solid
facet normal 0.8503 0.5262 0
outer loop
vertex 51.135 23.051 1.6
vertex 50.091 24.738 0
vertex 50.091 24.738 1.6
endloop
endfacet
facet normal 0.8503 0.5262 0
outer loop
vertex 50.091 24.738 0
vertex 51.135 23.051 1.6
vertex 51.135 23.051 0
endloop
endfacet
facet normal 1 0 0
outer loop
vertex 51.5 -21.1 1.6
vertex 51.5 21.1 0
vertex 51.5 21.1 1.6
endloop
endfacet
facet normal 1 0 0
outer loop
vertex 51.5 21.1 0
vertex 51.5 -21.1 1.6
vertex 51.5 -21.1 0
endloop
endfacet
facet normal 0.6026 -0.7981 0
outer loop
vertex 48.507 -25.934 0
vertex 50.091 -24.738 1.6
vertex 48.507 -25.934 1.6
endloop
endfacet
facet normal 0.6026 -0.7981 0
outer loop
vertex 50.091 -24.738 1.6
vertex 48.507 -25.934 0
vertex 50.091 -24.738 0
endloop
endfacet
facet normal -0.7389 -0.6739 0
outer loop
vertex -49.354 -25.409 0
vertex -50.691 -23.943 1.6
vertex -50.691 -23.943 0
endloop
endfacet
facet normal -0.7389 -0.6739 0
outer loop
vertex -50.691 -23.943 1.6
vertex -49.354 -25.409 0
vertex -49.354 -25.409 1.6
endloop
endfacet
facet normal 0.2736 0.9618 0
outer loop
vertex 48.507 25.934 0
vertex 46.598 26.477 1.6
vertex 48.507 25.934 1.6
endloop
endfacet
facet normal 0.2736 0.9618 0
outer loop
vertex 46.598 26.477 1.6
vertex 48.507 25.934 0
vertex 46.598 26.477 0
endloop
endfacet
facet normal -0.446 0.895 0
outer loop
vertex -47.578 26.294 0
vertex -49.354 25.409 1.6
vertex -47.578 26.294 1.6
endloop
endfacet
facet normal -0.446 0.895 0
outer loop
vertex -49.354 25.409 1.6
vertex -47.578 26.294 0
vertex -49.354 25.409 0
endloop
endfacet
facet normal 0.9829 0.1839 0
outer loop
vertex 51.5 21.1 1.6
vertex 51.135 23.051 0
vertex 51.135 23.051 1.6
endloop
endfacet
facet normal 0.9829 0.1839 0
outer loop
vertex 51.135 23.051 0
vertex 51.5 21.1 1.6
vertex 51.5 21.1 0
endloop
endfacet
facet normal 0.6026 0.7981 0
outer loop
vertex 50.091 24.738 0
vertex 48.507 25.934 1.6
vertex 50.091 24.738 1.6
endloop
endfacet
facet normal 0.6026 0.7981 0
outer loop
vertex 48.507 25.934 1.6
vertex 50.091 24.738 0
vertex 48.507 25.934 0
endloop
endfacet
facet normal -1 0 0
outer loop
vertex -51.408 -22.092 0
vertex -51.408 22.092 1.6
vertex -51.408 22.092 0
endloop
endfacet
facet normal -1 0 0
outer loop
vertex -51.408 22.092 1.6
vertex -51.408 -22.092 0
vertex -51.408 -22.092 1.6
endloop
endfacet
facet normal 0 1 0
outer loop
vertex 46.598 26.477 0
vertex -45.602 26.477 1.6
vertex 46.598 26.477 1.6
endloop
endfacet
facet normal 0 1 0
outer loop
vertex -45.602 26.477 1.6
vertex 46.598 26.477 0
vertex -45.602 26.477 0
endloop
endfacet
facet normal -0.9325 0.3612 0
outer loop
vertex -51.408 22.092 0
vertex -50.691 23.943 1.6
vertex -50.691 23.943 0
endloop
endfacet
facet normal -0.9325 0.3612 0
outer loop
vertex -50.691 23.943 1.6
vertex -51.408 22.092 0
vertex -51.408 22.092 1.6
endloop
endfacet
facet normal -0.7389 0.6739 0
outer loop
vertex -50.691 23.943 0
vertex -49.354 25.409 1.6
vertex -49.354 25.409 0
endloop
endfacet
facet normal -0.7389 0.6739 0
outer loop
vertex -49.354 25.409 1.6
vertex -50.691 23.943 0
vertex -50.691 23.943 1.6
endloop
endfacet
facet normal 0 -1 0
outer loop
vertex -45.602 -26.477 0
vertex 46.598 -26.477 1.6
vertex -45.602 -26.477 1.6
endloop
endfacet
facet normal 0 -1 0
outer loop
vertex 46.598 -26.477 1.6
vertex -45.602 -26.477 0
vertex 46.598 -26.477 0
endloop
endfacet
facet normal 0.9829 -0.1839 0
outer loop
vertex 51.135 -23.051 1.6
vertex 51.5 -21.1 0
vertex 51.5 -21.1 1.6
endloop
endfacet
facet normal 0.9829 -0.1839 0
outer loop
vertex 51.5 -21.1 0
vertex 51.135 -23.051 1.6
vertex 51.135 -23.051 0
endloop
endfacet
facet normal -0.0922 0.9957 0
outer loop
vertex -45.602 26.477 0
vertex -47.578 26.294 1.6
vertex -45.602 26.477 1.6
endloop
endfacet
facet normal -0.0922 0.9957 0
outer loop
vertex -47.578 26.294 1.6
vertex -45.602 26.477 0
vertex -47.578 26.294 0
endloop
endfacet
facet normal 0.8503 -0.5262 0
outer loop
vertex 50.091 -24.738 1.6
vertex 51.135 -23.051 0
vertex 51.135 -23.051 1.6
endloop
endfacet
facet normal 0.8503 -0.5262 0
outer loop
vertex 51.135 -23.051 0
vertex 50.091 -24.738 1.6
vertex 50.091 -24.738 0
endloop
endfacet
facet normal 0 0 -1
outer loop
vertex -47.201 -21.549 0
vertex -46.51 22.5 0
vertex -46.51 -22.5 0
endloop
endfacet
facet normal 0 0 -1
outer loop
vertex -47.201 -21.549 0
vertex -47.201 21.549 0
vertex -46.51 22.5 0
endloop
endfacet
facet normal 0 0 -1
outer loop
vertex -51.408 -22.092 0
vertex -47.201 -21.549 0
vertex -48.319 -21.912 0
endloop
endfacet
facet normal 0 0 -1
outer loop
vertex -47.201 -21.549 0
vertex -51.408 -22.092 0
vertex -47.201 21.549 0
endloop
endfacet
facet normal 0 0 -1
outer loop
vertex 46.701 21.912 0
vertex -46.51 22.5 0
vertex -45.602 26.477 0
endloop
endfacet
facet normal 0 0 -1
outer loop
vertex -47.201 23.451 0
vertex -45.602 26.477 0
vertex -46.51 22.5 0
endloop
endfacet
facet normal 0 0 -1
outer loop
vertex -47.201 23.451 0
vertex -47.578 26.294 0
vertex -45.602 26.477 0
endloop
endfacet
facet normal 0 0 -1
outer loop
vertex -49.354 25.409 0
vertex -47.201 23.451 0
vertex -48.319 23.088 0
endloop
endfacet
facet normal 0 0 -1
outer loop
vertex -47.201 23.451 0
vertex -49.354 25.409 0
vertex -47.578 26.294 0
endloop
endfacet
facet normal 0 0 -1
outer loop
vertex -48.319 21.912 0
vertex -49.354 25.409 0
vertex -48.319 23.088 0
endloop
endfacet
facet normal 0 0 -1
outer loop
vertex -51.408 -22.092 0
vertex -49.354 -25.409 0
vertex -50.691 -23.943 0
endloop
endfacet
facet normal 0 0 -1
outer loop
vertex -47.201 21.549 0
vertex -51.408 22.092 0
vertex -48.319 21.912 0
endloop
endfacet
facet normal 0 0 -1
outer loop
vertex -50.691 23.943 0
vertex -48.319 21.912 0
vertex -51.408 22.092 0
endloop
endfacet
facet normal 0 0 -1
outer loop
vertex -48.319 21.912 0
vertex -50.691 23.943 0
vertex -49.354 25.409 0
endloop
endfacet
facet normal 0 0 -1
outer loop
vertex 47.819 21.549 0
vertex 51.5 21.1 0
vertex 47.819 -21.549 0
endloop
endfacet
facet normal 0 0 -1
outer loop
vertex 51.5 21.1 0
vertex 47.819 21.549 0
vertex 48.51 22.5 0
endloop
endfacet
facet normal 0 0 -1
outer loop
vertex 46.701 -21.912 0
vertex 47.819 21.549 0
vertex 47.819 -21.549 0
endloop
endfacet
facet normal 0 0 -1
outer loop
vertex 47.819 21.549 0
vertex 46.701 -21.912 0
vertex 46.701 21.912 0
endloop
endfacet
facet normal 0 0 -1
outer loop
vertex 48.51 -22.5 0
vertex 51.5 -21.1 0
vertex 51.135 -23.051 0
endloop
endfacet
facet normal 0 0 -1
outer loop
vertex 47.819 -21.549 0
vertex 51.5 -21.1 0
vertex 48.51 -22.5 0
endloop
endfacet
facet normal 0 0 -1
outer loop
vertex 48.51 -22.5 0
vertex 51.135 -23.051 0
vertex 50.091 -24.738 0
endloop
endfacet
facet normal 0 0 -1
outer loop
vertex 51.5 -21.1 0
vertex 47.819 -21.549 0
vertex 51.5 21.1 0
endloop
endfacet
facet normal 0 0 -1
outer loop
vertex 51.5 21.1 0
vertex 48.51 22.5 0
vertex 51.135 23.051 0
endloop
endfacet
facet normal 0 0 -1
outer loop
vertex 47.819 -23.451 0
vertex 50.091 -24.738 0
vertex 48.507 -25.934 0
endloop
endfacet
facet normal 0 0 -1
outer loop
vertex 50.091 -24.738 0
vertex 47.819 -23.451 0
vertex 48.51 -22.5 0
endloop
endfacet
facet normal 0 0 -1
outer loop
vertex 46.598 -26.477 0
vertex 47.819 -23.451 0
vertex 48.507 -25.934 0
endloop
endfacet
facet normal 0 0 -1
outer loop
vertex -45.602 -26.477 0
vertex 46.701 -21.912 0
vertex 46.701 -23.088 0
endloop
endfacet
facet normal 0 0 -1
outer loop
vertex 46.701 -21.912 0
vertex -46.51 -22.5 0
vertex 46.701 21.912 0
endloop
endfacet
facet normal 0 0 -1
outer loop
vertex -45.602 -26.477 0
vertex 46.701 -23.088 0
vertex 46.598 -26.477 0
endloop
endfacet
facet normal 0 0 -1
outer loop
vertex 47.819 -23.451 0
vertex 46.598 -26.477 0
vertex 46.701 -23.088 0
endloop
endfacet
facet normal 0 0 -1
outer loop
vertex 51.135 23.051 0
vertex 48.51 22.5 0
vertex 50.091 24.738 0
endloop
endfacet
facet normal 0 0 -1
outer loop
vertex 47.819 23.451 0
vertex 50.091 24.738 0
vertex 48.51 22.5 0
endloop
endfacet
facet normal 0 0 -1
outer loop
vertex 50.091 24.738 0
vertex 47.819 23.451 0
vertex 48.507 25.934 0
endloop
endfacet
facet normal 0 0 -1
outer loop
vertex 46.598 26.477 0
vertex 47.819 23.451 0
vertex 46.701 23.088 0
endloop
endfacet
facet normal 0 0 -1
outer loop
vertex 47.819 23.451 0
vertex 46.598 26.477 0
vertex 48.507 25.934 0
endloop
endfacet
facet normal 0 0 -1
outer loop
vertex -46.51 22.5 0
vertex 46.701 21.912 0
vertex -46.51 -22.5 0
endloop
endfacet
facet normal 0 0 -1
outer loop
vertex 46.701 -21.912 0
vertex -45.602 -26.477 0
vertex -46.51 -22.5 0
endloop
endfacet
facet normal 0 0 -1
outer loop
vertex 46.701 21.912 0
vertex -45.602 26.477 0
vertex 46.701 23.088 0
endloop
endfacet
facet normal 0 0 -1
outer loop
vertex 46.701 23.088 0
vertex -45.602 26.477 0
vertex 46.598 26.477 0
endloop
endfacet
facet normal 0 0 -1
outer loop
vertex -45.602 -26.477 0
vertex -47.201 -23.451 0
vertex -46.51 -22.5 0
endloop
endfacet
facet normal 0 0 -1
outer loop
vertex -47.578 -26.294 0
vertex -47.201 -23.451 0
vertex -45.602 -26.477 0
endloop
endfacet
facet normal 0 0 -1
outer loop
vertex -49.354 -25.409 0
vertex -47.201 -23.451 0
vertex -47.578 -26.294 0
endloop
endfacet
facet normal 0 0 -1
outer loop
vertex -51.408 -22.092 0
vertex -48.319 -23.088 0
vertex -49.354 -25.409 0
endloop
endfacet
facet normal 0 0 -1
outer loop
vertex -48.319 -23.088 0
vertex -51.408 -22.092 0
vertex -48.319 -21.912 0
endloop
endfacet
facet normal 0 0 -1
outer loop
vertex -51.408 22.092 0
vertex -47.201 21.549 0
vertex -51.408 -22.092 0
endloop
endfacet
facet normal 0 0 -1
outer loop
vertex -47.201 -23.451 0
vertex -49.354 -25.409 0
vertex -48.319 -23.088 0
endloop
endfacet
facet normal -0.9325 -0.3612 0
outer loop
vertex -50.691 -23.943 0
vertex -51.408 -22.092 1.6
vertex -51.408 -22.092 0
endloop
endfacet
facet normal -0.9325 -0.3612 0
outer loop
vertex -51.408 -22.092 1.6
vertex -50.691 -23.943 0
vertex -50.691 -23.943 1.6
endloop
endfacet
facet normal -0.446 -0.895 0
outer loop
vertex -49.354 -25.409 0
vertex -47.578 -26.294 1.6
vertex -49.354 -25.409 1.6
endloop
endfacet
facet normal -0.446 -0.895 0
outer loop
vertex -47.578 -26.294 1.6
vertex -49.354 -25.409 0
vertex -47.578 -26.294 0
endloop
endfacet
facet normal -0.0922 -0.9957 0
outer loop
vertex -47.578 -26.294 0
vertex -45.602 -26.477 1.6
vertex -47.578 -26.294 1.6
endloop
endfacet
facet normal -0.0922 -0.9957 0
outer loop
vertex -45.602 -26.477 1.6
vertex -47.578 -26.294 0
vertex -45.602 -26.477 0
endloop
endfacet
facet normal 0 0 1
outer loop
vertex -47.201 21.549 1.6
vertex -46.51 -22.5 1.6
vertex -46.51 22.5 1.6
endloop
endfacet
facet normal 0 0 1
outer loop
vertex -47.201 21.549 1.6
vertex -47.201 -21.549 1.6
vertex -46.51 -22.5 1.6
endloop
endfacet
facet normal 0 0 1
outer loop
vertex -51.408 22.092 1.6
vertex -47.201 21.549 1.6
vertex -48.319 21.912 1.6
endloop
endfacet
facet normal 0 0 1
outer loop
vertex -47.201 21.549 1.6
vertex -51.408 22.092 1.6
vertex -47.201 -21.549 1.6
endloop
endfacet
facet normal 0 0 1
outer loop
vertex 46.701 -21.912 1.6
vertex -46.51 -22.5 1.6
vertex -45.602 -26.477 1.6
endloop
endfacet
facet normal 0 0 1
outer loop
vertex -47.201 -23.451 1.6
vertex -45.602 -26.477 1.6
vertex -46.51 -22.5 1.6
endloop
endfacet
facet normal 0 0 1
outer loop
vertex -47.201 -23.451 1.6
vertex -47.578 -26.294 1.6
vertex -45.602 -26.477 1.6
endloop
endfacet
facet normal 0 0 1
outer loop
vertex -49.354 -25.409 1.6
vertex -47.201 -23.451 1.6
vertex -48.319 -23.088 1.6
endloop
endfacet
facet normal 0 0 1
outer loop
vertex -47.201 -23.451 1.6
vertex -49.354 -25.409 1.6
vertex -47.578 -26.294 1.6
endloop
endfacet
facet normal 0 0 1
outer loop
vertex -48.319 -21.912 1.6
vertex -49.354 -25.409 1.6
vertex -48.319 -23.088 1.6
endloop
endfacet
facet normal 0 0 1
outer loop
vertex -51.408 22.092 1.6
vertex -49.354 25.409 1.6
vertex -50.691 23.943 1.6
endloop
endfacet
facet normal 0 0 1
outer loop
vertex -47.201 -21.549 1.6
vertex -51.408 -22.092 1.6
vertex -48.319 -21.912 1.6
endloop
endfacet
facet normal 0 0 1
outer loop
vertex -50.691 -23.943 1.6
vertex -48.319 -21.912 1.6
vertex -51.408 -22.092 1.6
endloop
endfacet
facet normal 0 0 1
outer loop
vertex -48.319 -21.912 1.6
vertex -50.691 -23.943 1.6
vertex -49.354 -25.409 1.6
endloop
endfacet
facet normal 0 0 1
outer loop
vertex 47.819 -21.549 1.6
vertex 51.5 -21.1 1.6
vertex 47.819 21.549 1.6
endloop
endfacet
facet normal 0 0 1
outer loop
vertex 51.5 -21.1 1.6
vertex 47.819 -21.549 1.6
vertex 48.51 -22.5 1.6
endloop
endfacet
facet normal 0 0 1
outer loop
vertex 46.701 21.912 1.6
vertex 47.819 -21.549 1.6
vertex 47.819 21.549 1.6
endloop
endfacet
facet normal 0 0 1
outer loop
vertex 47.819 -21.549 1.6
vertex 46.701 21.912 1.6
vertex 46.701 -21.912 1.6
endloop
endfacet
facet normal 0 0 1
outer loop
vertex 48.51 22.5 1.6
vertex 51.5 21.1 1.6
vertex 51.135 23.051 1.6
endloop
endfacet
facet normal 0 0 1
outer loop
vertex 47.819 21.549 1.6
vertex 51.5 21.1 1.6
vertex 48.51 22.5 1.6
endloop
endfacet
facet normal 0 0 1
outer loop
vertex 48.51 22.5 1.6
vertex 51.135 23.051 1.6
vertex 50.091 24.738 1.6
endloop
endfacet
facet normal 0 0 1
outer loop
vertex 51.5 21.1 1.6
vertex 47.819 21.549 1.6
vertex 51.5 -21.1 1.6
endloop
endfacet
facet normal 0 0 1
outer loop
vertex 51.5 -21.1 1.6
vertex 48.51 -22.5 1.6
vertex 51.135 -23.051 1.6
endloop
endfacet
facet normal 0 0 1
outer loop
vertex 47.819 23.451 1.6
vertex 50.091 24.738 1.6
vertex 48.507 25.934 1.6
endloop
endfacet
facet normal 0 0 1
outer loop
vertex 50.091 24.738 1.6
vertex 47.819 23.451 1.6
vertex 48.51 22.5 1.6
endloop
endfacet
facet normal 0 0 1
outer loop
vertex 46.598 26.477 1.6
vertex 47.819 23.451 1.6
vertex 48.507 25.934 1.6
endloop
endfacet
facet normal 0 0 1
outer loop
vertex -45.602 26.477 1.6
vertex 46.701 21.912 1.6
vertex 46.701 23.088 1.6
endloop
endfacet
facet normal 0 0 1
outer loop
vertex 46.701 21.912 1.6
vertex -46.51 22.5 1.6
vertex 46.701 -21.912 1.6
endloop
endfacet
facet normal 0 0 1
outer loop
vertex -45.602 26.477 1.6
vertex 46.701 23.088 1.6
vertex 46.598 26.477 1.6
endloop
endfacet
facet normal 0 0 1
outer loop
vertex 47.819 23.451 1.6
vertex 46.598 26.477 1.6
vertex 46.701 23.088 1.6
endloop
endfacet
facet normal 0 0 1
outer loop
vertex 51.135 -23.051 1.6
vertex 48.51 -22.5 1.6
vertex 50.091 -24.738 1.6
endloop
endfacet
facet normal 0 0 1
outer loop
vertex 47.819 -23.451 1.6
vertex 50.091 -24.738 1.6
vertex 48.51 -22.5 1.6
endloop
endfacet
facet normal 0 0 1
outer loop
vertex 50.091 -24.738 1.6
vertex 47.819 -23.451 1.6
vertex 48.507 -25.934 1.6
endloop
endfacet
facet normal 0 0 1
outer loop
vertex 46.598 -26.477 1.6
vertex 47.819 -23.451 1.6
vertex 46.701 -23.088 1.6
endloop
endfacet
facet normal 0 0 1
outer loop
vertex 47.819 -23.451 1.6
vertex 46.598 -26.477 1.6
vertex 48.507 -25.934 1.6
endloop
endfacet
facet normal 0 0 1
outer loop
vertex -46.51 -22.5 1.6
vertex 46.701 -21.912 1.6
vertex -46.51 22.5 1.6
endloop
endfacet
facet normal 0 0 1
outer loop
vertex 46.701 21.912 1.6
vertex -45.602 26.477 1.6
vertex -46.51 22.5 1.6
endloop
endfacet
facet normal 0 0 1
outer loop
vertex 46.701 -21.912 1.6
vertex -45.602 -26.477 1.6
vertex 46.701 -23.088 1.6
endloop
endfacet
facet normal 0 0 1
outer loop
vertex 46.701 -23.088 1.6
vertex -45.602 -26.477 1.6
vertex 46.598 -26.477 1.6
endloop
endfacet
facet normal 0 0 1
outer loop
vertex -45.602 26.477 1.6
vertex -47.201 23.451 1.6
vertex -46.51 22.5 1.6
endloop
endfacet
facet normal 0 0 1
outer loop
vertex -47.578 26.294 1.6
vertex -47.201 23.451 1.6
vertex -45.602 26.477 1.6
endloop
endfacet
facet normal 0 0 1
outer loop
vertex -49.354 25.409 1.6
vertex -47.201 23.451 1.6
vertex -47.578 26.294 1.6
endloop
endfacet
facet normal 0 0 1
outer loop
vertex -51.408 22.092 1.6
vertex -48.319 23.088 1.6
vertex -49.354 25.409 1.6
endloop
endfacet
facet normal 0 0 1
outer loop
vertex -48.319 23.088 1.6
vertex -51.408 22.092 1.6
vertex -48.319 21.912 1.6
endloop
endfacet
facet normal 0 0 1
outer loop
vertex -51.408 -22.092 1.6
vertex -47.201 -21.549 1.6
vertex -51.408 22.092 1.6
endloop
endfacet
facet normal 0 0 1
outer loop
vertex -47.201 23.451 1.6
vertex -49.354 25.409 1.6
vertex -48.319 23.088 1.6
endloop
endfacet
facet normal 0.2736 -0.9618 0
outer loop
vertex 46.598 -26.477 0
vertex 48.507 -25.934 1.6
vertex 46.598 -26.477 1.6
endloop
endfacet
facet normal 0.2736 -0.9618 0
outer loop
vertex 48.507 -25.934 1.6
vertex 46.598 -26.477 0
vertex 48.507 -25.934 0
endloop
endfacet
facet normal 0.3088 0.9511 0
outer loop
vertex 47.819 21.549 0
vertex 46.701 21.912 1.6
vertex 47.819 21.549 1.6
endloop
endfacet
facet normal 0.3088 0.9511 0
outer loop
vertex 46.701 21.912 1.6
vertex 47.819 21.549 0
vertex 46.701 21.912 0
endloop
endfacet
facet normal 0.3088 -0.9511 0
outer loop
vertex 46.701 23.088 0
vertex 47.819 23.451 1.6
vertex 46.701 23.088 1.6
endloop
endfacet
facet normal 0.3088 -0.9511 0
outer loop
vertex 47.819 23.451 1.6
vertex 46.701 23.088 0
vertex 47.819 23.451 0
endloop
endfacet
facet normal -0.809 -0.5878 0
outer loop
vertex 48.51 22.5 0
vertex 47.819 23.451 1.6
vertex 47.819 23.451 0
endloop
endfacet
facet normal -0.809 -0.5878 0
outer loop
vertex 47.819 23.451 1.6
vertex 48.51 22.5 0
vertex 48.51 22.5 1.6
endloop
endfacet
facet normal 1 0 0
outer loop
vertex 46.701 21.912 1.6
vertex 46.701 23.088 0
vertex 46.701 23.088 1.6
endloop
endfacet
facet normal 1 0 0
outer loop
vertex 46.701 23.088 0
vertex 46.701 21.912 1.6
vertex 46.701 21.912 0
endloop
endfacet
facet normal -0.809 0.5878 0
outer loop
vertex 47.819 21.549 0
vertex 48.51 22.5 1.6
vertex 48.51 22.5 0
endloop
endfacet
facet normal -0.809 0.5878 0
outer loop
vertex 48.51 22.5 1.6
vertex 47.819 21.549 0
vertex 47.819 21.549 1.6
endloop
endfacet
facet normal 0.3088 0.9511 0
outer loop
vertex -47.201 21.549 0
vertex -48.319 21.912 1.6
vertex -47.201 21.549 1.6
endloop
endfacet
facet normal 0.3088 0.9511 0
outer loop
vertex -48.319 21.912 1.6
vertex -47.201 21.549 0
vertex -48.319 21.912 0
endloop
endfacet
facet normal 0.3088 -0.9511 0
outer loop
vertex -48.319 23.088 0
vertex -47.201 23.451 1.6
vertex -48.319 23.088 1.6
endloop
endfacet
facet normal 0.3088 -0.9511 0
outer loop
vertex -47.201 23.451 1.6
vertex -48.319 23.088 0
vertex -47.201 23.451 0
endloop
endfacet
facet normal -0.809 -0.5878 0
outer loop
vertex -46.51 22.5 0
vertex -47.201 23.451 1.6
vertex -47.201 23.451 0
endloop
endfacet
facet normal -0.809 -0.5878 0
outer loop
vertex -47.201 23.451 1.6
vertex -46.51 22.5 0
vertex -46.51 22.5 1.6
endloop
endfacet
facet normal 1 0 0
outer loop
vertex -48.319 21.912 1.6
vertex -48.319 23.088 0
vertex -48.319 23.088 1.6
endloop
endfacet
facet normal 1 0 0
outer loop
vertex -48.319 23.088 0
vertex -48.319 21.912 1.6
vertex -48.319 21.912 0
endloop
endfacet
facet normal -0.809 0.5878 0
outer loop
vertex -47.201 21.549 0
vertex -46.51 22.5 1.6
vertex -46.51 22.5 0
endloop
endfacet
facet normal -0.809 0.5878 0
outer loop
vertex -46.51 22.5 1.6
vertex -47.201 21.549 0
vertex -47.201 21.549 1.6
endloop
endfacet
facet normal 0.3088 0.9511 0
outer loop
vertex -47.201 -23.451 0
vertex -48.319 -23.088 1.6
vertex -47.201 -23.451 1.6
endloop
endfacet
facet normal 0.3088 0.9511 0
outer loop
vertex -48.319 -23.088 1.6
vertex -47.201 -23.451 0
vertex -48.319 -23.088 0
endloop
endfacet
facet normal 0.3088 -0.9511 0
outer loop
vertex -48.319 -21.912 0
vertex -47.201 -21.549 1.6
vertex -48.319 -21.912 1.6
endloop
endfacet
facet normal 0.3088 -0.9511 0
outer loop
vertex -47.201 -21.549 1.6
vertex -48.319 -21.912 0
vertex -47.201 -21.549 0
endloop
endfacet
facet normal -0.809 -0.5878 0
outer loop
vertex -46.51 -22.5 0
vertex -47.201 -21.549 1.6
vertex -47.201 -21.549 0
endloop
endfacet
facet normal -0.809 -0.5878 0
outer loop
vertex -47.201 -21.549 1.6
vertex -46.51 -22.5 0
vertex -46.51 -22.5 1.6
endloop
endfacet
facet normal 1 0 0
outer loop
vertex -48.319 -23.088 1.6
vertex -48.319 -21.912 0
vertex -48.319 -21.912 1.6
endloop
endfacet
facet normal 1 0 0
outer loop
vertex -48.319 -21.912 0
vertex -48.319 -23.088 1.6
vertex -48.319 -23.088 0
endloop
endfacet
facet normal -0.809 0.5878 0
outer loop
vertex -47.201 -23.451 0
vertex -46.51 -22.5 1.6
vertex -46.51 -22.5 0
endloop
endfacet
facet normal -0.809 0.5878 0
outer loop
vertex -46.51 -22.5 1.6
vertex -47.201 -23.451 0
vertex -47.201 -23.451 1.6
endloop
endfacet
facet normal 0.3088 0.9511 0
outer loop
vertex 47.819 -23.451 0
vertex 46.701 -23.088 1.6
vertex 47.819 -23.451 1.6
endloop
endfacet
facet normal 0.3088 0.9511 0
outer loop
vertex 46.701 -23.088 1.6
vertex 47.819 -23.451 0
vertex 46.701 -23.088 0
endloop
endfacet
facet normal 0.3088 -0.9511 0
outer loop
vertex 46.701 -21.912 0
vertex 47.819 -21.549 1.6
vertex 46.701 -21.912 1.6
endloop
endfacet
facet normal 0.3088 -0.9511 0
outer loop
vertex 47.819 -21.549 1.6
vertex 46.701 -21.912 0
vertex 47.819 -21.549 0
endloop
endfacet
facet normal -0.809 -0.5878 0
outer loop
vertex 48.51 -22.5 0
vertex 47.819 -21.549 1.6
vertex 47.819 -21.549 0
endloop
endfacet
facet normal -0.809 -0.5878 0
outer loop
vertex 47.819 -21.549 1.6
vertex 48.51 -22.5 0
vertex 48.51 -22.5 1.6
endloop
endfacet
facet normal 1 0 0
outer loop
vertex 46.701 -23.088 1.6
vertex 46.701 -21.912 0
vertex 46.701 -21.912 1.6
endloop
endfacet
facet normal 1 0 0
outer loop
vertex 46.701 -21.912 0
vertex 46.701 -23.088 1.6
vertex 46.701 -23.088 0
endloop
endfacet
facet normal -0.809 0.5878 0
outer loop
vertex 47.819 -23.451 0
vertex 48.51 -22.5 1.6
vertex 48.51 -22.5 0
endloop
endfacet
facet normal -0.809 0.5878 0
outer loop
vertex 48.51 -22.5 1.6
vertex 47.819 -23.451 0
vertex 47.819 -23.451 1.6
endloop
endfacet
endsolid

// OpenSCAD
// file: ../configuration.scad
//UNIBOX04A
//------------------------------------------------------------
///*

rozmer_x=103;
rozmer_y=53;
sila=1.5;

roztec_srouby_x=95.02;
roztec_srouby_y=45;
prumer_sroubu=2;
zakulaceni_hrany=5.4;

roztec_der=10.16;
pocet_der_osa_x=8;
// main file
include <../configuration.scad>


//PLBASE ZAKLADNI
//------------------------------------------------------------

UNIBOX04A_D01();

module UNIBOX04A_D01(){

difference () {

translate([-(rozmer_x/2-zakulaceni_hrany),-(rozmer_y/2-zakulaceni_hrany),0]) 
minkowski()
    {
	cube([rozmer_x-2*zakulaceni_hrany,rozmer_y-2*zakulaceni_hrany,sila]);         
        cylinder(r=zakulaceni_hrany,h=0.1);
    }
  
//odecet otvory

translate([roztec_srouby_x/2,roztec_srouby_y/2,0])      
    cylinder(sila*5, d=prumer_sroubu, center=true);   
  
translate([-roztec_srouby_x/2,roztec_srouby_y/2,0])      
    cylinder(sila*5, d=prumer_sroubu, center=true);    

translate([-roztec_srouby_x/2,-roztec_srouby_y/2,0])      
    cylinder(sila*5, d=prumer_sroubu, center=true);

translate([roztec_srouby_x/2,-roztec_srouby_y/2,0])      
    cylinder(sila*5, d=prumer_sroubu, center=true);

}
}
